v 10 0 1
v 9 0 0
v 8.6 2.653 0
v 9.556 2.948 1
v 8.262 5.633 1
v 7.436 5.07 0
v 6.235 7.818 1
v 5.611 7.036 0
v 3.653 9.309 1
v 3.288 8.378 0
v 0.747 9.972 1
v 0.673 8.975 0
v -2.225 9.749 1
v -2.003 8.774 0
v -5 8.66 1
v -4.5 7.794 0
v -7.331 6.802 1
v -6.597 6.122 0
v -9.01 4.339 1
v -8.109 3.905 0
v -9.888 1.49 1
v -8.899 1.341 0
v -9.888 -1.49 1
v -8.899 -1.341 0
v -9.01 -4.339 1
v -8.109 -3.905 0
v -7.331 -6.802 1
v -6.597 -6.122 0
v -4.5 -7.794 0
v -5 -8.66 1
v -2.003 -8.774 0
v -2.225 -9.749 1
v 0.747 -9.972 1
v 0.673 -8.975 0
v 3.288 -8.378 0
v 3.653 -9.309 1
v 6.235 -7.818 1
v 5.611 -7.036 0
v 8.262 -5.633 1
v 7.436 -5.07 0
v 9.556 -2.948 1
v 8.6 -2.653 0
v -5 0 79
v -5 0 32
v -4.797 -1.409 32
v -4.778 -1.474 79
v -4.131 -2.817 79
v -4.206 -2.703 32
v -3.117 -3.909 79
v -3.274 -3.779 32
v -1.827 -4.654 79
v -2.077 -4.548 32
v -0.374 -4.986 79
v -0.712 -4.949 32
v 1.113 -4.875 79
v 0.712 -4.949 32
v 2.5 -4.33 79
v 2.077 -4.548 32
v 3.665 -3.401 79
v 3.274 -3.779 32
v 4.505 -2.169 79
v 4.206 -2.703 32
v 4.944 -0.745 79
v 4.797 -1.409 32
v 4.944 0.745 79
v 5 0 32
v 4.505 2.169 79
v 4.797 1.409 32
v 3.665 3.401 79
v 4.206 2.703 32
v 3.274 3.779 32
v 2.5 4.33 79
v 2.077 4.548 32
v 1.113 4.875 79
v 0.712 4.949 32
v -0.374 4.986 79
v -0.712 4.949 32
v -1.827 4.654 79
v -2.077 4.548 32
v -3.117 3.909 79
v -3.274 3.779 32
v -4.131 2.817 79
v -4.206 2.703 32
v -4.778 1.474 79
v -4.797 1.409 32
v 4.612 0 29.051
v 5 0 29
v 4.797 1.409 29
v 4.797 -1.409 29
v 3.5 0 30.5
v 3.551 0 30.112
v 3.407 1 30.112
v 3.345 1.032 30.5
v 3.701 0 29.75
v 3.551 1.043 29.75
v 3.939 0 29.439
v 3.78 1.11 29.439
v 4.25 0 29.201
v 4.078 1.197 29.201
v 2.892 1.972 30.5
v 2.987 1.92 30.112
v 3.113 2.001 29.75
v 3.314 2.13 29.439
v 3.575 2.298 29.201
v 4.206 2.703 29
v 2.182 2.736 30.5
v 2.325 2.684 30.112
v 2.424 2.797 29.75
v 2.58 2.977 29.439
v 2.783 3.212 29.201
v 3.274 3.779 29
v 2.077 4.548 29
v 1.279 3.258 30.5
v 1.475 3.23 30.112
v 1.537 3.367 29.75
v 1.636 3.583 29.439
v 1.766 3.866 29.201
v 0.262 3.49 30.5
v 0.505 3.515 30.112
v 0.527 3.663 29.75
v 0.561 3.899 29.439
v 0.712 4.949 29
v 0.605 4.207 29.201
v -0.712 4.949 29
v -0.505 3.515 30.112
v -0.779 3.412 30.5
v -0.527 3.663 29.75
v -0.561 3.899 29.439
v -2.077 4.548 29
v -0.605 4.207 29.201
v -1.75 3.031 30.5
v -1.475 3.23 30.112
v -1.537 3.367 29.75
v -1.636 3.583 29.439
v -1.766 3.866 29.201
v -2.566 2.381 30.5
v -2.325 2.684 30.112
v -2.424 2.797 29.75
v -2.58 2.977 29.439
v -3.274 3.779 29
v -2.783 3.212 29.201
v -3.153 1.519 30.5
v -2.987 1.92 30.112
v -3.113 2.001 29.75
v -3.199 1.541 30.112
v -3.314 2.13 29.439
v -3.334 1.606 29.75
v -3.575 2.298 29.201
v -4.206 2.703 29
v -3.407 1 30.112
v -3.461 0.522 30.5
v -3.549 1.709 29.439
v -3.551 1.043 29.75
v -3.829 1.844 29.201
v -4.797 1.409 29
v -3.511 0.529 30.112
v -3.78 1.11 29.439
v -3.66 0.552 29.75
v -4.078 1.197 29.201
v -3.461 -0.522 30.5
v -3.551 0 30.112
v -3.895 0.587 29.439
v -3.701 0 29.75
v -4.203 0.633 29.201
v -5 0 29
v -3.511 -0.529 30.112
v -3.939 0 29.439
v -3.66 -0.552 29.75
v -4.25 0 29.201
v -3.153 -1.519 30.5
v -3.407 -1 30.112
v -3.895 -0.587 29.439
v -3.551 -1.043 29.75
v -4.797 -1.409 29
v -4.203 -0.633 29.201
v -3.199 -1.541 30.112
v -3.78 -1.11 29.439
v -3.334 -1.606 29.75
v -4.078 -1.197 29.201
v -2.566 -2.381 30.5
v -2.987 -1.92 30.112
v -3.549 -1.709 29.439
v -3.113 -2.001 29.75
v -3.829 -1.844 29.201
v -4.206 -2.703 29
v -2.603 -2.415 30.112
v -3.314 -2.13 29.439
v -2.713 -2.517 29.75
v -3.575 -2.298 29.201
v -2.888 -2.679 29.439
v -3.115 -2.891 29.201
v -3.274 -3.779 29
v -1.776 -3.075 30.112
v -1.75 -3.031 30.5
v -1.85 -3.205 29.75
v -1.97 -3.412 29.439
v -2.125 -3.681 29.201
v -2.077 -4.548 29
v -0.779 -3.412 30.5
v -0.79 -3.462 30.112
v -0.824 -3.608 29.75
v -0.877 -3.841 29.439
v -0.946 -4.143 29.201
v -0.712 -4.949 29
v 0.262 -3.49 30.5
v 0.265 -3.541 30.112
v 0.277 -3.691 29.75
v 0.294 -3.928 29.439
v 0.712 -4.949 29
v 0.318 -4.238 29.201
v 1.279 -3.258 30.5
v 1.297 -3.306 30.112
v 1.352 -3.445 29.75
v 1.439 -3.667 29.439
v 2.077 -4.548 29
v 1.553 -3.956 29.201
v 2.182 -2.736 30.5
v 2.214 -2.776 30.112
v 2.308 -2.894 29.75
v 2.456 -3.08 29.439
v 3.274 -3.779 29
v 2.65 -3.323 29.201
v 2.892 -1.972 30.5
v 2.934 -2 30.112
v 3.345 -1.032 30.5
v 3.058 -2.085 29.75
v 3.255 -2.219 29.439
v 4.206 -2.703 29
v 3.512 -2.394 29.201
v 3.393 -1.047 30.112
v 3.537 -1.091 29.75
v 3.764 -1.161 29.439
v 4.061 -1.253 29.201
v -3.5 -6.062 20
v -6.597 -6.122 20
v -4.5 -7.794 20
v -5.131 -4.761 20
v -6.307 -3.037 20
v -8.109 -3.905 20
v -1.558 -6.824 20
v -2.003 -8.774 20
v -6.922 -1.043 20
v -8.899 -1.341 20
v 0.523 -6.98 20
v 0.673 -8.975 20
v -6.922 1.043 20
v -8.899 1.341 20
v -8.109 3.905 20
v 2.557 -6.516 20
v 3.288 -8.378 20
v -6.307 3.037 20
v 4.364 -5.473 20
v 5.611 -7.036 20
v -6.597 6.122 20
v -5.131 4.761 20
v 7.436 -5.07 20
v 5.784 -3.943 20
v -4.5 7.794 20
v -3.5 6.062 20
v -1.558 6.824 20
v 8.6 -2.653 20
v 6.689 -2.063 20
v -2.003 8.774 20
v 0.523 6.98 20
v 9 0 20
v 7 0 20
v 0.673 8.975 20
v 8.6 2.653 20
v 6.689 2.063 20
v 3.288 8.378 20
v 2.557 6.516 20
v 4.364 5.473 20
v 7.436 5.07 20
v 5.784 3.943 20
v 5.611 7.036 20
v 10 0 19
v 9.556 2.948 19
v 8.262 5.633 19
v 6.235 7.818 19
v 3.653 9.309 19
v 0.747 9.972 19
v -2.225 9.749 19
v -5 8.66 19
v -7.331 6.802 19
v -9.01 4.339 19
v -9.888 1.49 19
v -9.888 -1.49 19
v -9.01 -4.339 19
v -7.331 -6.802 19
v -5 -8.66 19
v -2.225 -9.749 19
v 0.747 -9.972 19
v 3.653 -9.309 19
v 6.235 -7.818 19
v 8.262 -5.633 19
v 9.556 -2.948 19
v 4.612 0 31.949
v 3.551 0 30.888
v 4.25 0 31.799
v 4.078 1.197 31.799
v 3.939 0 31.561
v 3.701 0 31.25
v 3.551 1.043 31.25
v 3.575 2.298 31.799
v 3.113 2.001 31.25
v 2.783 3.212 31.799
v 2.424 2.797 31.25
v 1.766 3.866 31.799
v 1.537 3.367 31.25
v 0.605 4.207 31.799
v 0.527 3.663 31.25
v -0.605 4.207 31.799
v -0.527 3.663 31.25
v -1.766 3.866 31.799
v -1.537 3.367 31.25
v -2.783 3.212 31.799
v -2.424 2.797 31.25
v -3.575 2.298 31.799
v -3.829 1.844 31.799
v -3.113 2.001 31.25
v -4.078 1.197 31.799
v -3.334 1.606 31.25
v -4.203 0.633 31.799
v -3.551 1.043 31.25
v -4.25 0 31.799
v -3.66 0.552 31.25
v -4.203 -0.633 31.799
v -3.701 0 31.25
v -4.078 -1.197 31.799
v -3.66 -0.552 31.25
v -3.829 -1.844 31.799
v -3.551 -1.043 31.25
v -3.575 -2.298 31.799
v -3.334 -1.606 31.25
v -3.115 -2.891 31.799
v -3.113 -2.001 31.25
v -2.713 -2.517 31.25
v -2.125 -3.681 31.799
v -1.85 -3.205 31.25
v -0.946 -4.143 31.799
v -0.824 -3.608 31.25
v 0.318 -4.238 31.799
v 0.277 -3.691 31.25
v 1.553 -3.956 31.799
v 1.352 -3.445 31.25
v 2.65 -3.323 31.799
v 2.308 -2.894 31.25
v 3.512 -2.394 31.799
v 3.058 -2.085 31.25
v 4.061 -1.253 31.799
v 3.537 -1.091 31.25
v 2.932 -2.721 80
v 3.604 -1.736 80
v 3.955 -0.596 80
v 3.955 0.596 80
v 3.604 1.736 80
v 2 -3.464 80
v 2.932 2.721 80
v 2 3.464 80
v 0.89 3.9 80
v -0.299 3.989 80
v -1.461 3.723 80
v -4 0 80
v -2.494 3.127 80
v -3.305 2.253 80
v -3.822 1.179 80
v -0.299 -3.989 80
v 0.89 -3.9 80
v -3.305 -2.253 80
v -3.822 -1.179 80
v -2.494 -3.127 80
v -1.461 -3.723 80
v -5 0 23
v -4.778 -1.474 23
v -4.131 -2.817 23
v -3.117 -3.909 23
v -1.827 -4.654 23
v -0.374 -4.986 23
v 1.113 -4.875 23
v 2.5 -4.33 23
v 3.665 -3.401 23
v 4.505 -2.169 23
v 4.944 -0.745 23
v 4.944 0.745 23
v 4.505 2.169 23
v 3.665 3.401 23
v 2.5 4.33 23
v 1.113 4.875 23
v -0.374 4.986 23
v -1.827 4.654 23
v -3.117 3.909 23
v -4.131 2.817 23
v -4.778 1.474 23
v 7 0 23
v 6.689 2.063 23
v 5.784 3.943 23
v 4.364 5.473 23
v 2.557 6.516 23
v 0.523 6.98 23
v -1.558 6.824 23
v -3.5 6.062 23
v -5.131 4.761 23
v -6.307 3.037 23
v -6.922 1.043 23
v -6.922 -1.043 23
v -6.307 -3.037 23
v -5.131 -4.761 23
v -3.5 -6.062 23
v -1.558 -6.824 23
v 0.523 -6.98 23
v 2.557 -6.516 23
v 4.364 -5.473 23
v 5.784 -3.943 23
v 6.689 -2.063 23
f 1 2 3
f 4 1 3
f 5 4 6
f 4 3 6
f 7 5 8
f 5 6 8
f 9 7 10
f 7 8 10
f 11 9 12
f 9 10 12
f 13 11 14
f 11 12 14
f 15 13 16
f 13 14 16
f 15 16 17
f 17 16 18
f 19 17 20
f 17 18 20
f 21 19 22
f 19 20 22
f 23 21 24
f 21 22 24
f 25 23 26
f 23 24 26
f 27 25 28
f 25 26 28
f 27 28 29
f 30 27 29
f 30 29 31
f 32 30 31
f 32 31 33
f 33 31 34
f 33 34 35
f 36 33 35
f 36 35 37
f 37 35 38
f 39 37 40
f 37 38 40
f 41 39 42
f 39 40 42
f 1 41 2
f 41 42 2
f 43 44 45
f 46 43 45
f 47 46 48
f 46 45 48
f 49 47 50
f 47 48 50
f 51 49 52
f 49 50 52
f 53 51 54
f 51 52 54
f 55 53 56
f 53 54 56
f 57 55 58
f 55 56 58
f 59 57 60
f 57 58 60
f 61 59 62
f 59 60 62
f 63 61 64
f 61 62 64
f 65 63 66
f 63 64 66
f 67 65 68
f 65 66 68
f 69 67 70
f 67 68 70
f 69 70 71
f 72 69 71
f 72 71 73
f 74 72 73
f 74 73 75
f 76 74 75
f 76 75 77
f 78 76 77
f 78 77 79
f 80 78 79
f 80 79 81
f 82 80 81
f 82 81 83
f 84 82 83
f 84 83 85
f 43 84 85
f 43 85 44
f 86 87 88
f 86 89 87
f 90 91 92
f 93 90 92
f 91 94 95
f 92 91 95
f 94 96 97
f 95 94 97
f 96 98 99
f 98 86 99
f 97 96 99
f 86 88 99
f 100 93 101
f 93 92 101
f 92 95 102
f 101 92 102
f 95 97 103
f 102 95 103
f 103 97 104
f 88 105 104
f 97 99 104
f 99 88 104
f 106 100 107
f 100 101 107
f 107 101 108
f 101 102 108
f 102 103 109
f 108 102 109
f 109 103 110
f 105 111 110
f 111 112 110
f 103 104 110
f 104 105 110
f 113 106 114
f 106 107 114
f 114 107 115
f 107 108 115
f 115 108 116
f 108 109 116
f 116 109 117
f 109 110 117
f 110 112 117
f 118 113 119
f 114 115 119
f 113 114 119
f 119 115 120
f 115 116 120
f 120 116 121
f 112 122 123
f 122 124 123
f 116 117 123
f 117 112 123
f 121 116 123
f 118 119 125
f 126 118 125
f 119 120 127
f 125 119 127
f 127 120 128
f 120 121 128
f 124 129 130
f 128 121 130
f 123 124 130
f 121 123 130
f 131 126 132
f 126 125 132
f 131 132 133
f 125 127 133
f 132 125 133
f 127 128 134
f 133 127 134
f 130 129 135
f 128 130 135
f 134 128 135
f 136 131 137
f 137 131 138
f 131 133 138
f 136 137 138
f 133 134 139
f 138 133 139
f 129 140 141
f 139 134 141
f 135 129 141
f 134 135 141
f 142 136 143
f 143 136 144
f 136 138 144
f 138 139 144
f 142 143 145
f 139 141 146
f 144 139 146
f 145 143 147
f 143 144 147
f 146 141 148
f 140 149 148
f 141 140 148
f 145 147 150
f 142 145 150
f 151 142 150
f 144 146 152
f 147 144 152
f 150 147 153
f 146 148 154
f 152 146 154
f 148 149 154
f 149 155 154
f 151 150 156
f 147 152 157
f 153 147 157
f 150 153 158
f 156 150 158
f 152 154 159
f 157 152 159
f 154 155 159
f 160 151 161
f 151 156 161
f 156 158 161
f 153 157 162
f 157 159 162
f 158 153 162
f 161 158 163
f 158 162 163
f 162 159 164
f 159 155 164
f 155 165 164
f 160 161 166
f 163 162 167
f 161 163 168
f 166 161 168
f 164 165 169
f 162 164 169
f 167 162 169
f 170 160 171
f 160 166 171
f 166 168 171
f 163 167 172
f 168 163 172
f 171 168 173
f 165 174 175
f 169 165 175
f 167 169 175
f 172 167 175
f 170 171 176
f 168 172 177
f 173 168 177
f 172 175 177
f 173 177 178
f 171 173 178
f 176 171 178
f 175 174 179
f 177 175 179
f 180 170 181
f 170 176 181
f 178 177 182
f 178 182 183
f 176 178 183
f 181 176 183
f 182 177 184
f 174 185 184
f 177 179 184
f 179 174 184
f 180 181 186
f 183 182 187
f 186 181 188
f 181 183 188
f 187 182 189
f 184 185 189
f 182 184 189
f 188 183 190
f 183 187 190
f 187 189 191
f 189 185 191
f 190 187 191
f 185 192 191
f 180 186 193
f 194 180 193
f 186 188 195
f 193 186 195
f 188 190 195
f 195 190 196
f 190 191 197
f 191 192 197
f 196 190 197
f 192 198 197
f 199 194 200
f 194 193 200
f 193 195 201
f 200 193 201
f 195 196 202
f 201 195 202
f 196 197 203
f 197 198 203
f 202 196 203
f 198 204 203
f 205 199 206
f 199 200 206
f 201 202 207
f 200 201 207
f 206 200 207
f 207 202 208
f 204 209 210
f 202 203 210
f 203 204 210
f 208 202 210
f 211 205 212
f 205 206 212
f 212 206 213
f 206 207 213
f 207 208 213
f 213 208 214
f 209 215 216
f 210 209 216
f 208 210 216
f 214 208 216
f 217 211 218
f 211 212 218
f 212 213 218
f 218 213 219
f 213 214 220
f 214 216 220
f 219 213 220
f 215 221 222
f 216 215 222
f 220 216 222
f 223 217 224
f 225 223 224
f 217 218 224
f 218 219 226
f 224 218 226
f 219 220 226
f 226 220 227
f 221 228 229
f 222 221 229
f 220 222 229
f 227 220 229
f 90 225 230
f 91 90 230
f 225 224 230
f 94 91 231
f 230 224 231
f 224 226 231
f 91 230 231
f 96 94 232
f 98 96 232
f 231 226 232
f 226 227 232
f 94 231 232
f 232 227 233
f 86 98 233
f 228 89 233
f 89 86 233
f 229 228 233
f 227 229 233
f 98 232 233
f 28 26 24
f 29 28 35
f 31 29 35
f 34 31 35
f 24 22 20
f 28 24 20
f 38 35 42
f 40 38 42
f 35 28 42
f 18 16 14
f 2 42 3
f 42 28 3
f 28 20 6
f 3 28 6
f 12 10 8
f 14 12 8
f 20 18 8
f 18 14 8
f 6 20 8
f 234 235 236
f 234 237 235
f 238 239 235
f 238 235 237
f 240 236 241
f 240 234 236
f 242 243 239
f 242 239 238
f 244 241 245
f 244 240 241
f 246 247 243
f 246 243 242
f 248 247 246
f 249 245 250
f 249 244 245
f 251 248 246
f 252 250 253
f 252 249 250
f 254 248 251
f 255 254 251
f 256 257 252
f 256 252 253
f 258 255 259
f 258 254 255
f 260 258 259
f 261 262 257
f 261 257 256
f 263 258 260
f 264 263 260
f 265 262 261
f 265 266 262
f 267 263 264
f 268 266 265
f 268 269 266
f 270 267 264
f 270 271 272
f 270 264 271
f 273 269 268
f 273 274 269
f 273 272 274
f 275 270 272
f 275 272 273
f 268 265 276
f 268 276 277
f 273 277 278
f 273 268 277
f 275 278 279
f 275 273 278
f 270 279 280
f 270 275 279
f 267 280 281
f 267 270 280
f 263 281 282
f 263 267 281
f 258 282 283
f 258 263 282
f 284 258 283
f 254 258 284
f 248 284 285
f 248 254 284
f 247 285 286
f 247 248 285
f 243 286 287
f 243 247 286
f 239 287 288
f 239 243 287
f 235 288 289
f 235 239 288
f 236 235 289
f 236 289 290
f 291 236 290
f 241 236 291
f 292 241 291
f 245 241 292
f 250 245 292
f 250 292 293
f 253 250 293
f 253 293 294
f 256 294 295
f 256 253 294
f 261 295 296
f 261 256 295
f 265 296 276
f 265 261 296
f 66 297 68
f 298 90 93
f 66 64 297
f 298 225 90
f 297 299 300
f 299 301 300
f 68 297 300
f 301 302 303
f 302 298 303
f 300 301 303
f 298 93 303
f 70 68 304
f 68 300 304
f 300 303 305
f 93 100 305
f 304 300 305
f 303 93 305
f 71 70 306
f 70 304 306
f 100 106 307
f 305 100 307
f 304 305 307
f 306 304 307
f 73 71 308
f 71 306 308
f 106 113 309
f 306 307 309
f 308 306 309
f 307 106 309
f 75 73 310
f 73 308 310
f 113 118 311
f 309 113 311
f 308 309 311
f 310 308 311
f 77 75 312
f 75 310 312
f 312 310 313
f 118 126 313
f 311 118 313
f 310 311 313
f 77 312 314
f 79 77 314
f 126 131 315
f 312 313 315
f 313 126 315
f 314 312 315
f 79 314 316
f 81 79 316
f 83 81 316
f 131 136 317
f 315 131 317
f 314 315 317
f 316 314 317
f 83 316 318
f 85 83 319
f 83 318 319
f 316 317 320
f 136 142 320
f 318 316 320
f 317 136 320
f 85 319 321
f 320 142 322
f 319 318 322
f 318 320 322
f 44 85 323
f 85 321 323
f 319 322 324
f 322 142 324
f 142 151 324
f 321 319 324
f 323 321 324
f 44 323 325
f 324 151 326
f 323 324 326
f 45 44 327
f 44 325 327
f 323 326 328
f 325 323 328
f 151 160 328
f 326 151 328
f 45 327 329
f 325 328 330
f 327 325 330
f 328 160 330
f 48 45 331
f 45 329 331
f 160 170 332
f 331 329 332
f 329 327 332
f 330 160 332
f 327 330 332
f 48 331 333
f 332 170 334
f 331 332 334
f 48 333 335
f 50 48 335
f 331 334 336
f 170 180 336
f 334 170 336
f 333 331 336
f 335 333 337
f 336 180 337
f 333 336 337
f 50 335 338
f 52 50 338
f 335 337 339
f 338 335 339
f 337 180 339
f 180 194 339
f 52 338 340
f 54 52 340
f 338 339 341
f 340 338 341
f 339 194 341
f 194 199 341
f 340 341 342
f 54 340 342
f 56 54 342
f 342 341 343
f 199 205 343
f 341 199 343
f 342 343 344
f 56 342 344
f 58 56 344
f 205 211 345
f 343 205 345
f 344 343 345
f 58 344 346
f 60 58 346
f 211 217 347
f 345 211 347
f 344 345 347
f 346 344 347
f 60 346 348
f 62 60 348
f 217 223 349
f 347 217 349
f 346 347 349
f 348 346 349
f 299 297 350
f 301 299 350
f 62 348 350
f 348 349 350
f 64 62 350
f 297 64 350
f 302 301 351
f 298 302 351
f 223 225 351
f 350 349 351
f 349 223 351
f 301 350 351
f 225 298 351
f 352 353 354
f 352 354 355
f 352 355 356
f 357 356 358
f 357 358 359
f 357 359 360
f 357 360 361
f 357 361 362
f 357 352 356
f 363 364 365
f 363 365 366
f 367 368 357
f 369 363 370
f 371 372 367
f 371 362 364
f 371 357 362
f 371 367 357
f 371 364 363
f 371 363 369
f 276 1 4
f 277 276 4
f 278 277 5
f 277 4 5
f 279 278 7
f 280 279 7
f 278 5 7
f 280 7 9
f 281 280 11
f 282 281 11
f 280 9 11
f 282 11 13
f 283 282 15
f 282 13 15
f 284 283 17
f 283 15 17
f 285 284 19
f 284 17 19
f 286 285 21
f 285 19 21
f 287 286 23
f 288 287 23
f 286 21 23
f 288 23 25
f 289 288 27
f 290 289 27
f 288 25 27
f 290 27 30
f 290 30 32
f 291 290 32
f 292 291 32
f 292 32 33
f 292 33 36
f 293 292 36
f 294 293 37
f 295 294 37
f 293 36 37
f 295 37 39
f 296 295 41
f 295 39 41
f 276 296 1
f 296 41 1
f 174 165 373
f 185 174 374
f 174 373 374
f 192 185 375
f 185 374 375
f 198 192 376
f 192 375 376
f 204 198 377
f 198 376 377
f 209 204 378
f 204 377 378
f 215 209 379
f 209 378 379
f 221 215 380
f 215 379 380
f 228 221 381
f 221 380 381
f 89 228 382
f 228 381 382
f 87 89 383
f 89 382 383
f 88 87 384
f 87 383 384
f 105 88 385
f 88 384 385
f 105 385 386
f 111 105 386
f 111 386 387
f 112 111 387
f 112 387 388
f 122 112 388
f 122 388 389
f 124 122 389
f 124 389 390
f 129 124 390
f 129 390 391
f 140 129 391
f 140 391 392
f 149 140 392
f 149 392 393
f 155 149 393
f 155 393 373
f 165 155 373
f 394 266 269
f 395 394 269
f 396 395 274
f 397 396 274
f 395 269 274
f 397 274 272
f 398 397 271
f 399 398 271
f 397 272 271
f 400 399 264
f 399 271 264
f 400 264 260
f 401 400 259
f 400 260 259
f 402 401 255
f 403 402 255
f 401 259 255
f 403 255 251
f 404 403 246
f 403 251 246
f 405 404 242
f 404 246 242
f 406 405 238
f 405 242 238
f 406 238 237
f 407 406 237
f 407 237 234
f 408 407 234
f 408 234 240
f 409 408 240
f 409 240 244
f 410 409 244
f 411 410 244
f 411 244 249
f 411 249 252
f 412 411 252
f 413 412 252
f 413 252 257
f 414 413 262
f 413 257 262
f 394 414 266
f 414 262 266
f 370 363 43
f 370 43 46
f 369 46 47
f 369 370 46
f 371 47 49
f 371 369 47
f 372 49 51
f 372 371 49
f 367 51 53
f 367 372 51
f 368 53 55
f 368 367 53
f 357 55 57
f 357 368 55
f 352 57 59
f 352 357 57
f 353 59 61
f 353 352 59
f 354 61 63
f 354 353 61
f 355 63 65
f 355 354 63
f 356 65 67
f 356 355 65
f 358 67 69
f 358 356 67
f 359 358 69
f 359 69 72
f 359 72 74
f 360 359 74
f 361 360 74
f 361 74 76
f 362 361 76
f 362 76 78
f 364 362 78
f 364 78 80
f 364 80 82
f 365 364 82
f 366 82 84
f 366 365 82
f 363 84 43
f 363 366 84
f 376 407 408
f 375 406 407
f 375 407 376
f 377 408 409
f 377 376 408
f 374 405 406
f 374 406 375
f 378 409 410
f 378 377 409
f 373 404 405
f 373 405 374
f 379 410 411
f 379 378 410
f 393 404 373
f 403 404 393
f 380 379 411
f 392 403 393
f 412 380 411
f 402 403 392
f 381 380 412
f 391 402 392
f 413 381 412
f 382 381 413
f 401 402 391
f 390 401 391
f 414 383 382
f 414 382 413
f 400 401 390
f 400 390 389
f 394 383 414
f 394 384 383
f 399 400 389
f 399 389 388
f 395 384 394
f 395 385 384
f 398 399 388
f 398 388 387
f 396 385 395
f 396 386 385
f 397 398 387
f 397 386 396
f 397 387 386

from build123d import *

# Parameters (mm, degrees)
ESBO_O1_R                = 10
RESSALTO_EXTRUS_O1_DEPTH = 20
ESBO_O2_R                = 7
RESSALTO_EXTRUS_O2_DEPTH = 3
ESBO_O3_R                = 5
RESSALTO_EXTRUS_O3_DEPTH = 57
CHANFRO1_SIZE            = 1
CHANFRO2_SIZE            = 1
CHANFRO3_SIZE            = 1
ESBO_O5_R                = 1.5


with BuildPart() as part:
    # Esboço1 → Ressalto-extrusão1 (new body)
    with BuildSketch(Plane.XY):
        Circle(ESBO_O1_R)
    extrude(amount=RESSALTO_EXTRUS_O1_DEPTH)

    # Esboço2 → Ressalto-extrusão2 (add)
    with BuildSketch(Plane.XY.offset(20)):
        Circle(ESBO_O2_R)
    extrude(amount=RESSALTO_EXTRUS_O2_DEPTH)

    # Esboço3 → Ressalto-extrusão3 (add)
    with BuildSketch(Plane.XY.offset(23)):
        with Locations(Location((0, 0, 0), (0, 0, 180))):
            Circle(ESBO_O3_R)
    extrude(amount=RESSALTO_EXTRUS_O3_DEPTH)

    # Chanfro1
    chanfro1_edges = [part.edges().sort_by_distance(p)[0] for p in [
        (-10, 0, 0),
    ]]
    chamfer(chanfro1_edges, length=CHANFRO1_SIZE)

    # Chanfro2
    chanfro2_edges = [part.edges().sort_by_distance(p)[0] for p in [
        (-10, 0, 20),
    ]]
    chamfer(chanfro2_edges, length=CHANFRO2_SIZE)

    # Chanfro3
    chanfro3_edges = [part.edges().sort_by_distance(p)[0] for p in [
        (5, 0, 80),
    ]]
    chamfer(chanfro3_edges, length=CHANFRO3_SIZE)

    # Varredura de corte1: sweep along a path in Esboço7
    with BuildLine(Plane.XY.offset(30.5)) as varredura_de_corte1_path:
        CenterArc((0, 0), 5, 0, 360)
    # Esboço5 → Varredura de corte1 (sweep, cut)
    with BuildSketch(Plane(origin=(0, 0, 0), x_dir=(1, 0, 0), z_dir=(0, 1, 0))):
        with Locations((-5, -30.5)):
            Circle(ESBO_O5_R)
    sweep(path=varredura_de_corte1_path.line, mode=Mode.SUBTRACT)


solid = part.part
